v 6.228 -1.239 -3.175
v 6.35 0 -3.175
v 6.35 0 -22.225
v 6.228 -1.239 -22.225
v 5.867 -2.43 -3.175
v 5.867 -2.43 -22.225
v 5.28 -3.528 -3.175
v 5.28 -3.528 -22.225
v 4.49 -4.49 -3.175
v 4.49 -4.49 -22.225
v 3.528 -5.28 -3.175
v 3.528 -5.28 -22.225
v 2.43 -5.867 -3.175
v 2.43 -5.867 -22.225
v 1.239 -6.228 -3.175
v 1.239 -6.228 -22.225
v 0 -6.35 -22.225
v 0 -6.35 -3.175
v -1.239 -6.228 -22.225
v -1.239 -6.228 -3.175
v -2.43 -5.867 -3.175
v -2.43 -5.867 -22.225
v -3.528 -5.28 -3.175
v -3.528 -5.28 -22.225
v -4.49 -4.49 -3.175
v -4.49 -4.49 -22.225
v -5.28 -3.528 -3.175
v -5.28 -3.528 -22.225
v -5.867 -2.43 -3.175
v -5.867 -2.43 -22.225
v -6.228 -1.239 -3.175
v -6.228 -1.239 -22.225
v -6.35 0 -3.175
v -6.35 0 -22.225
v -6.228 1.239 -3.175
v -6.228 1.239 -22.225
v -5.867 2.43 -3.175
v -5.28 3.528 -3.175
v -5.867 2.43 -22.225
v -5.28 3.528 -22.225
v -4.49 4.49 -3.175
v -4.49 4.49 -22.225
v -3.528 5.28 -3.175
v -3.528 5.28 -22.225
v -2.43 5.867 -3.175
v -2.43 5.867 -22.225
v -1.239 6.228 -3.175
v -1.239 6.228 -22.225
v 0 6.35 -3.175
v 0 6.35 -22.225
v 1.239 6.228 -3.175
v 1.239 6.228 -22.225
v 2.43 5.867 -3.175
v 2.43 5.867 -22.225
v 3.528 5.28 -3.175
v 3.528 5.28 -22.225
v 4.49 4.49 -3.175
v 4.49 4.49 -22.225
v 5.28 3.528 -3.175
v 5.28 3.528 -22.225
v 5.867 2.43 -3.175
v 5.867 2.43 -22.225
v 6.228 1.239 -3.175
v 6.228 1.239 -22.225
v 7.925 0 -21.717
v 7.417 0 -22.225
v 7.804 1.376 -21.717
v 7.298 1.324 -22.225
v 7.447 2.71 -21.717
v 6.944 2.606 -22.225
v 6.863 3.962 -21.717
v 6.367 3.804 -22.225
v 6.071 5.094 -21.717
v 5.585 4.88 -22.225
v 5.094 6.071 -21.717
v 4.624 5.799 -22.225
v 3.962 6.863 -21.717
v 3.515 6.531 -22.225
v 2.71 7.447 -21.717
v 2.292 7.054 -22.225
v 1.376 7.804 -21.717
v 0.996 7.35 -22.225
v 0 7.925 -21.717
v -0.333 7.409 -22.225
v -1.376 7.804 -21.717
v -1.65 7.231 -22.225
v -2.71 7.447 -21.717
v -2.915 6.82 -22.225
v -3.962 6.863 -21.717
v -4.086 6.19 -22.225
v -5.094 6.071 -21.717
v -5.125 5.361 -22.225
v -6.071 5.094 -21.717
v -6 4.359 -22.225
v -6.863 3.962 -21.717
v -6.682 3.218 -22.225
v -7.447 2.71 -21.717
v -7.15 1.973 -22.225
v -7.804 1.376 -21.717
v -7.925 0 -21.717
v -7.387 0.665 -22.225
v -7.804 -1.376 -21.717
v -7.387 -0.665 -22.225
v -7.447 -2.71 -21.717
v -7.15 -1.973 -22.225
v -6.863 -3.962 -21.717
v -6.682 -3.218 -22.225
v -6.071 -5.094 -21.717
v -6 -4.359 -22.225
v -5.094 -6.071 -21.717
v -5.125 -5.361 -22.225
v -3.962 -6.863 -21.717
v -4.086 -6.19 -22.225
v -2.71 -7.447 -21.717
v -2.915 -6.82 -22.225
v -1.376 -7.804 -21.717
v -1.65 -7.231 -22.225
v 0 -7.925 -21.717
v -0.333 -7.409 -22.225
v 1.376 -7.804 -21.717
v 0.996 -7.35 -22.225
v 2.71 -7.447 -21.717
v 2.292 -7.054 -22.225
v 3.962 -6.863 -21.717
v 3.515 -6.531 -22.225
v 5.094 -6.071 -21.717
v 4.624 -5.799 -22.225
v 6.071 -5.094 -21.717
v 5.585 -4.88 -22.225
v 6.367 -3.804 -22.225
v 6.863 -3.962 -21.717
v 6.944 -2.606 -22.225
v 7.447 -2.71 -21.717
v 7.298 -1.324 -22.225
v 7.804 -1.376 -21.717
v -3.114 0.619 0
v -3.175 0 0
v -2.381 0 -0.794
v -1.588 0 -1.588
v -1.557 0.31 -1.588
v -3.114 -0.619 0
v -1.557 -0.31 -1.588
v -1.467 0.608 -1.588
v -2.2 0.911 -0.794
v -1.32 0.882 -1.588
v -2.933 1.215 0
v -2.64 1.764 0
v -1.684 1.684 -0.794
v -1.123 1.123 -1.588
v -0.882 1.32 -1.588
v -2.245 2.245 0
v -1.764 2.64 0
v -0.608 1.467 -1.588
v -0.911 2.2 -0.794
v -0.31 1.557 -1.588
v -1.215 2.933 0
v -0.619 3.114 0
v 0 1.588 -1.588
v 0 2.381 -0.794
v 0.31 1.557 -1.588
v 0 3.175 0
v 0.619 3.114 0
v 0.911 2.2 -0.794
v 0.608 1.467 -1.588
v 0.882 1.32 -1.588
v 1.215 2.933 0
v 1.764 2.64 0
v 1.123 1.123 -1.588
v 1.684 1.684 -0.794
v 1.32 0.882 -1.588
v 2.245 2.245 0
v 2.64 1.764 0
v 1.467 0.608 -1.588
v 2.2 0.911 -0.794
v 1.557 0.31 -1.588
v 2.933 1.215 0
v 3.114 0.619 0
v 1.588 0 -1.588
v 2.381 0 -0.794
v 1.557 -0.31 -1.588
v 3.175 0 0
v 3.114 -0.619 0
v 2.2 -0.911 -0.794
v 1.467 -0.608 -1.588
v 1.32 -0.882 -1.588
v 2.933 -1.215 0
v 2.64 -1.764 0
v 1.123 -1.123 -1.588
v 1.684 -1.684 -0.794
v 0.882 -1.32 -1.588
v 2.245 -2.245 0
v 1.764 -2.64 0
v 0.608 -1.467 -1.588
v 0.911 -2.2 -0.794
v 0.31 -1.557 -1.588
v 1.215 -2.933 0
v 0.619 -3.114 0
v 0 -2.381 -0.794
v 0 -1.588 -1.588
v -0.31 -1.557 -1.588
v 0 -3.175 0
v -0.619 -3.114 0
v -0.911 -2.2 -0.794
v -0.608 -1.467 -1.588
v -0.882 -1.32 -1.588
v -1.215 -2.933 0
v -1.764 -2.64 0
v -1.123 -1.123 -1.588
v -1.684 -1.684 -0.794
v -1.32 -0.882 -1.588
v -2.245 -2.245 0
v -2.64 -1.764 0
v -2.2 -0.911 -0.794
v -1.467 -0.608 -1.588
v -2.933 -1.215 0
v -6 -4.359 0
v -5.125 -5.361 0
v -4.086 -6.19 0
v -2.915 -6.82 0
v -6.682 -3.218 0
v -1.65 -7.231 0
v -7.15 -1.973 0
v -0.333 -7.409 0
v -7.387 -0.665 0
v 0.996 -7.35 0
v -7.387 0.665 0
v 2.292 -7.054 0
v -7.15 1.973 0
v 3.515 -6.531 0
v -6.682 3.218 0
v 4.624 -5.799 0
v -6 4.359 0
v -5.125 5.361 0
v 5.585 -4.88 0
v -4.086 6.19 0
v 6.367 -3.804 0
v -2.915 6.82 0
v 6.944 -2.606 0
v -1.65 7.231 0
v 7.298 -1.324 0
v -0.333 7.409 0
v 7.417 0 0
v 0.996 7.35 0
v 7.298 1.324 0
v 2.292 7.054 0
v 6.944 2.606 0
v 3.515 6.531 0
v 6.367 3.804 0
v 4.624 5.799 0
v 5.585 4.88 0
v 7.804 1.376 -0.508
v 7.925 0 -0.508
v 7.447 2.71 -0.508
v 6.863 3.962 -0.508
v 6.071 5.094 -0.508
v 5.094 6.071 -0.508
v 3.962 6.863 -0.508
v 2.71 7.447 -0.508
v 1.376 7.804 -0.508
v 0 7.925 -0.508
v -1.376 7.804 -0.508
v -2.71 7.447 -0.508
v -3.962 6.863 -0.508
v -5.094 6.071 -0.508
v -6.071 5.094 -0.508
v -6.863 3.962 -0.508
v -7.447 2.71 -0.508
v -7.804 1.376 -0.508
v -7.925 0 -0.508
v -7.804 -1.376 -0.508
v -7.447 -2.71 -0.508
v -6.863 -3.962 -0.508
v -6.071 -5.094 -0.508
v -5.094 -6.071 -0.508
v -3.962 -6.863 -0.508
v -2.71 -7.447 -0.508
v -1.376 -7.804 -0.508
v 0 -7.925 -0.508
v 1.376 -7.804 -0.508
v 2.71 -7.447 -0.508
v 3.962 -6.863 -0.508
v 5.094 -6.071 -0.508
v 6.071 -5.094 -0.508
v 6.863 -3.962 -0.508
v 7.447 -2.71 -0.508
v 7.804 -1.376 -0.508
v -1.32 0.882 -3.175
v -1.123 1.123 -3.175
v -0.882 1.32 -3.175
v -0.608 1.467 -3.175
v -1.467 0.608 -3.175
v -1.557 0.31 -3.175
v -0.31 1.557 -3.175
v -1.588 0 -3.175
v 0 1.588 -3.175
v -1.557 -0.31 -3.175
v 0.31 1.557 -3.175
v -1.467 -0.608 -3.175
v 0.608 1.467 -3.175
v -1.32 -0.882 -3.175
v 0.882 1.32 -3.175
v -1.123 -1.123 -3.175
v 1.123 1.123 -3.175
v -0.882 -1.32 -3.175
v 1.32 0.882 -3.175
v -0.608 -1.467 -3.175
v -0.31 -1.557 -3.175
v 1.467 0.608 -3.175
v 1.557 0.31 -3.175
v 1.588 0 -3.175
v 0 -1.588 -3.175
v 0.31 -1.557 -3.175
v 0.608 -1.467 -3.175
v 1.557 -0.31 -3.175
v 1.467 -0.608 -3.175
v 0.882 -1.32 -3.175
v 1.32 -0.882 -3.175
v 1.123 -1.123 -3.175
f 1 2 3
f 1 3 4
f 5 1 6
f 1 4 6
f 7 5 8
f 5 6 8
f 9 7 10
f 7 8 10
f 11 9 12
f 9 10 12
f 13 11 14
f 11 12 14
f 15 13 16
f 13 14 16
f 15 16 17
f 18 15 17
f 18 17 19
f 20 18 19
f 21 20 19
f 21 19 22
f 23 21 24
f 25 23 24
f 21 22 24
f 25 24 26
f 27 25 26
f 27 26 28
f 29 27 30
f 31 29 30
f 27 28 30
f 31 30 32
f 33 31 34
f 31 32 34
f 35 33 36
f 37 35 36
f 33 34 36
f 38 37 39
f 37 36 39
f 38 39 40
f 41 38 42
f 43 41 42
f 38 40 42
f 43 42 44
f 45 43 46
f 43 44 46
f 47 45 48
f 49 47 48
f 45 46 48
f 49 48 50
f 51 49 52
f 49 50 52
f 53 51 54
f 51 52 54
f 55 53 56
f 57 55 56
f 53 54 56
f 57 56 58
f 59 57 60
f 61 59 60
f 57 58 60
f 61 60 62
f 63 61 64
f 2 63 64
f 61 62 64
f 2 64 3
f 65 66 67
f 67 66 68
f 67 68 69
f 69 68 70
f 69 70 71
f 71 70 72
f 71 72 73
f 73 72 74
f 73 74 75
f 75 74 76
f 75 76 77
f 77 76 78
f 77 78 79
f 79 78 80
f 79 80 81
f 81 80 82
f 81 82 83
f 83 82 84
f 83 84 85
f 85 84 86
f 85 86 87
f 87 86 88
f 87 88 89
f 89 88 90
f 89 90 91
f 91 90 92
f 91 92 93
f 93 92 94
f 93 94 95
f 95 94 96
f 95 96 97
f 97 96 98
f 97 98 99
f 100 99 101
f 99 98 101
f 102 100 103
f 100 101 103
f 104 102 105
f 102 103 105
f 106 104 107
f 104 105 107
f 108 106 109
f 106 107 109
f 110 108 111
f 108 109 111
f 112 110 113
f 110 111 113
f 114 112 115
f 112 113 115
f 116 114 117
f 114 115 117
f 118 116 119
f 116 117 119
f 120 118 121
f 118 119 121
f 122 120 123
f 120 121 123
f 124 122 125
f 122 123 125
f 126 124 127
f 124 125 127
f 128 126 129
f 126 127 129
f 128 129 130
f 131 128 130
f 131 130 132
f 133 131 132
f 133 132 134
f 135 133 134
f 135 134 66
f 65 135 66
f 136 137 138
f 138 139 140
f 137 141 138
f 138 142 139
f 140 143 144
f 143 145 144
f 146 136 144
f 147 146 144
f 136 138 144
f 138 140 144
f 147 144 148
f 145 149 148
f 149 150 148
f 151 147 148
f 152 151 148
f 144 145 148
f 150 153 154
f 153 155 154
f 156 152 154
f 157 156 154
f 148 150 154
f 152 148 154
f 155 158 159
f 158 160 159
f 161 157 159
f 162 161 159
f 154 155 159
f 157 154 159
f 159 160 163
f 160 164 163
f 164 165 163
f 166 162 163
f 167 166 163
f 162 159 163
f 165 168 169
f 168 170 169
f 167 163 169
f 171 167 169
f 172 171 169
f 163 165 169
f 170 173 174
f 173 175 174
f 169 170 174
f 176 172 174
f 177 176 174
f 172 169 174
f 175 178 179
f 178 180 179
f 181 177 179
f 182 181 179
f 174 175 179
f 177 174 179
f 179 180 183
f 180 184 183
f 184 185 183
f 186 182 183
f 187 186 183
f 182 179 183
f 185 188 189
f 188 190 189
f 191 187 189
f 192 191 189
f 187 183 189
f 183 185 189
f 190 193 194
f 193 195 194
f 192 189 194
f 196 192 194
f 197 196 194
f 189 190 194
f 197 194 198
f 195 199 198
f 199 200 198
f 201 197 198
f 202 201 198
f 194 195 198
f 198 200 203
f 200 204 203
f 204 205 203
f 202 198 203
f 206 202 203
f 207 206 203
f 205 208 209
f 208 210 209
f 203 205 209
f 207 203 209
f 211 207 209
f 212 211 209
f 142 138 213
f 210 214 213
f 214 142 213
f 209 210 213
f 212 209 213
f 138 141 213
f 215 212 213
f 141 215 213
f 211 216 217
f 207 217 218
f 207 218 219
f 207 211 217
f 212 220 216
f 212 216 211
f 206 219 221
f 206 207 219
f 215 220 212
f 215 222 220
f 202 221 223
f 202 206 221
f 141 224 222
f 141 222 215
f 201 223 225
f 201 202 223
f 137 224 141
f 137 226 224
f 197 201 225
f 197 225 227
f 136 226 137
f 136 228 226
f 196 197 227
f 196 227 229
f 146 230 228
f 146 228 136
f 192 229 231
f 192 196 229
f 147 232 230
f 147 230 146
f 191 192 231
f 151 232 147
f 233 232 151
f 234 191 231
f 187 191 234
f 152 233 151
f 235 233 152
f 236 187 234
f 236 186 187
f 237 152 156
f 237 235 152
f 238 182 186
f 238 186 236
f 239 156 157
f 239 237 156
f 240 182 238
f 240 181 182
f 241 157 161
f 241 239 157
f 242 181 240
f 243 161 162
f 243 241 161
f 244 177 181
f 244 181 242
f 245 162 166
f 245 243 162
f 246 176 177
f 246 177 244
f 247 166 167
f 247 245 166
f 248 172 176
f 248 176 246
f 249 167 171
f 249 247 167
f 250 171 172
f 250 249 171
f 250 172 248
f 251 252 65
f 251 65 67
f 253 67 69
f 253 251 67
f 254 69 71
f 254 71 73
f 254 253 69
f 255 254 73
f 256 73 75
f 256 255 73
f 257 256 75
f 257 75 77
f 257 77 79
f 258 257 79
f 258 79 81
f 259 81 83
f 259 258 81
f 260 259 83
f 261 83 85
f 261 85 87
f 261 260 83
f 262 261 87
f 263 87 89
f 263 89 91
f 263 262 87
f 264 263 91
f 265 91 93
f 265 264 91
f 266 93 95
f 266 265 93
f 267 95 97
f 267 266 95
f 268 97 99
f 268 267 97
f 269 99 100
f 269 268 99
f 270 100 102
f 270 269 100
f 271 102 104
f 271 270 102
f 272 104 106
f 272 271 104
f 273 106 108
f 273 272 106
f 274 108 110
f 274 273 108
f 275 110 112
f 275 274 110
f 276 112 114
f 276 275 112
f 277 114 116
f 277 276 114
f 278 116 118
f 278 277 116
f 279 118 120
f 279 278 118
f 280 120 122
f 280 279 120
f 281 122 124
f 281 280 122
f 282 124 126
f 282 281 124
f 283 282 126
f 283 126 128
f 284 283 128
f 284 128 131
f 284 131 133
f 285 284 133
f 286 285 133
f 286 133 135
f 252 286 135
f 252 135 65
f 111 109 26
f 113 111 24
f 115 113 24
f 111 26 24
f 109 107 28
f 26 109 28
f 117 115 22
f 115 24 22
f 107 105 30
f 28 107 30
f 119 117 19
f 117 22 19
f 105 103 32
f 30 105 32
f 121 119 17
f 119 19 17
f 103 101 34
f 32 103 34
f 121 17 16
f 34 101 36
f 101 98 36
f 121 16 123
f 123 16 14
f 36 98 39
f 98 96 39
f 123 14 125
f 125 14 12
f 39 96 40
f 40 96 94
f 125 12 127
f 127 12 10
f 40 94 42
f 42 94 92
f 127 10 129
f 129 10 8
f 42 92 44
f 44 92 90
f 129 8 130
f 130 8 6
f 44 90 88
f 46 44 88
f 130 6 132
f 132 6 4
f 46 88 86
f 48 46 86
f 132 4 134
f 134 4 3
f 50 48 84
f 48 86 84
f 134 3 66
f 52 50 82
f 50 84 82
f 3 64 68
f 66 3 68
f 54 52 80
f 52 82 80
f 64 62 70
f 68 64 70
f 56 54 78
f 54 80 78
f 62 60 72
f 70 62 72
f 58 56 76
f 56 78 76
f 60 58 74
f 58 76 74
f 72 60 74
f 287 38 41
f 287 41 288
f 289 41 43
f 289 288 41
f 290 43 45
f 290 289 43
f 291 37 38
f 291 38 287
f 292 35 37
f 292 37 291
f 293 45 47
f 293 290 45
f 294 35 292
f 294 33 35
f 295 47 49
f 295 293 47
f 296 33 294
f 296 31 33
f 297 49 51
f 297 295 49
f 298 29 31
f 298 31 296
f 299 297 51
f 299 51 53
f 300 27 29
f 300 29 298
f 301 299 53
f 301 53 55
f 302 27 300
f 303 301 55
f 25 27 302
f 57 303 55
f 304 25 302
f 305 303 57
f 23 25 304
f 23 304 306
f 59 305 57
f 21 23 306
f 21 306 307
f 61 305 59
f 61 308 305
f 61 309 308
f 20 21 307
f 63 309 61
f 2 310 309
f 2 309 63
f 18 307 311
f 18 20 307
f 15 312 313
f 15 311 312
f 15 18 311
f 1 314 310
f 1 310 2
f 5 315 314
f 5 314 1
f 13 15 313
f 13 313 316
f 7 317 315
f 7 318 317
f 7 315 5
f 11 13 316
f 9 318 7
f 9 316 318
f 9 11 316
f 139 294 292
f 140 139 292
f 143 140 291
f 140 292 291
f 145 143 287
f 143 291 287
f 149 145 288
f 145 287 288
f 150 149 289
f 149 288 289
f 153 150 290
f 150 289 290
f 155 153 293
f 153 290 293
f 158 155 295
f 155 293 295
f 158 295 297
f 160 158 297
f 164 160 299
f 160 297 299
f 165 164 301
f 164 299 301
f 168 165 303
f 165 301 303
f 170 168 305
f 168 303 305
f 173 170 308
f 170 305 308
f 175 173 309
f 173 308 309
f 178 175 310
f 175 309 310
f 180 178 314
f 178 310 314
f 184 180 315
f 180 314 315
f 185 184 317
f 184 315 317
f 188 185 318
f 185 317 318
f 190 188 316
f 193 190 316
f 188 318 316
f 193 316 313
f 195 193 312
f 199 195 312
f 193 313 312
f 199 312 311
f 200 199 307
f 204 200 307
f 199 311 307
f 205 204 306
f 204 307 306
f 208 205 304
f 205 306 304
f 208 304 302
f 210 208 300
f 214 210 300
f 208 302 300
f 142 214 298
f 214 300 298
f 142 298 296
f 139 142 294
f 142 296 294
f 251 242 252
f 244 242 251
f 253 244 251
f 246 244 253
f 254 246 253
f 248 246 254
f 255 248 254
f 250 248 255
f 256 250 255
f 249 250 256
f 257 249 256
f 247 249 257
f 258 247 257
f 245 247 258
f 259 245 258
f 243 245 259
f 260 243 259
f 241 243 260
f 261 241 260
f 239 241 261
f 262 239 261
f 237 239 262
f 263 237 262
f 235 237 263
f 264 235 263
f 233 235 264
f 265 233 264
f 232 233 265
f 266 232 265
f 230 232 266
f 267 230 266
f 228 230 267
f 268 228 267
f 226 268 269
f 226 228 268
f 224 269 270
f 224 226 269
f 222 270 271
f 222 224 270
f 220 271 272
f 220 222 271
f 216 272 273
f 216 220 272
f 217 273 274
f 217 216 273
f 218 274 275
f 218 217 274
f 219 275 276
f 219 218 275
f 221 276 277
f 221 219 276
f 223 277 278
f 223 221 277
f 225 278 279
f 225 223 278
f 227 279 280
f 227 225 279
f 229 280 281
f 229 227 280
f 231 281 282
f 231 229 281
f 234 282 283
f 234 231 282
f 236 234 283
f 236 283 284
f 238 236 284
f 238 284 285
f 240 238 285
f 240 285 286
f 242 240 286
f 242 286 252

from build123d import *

# Parameters (mm, degrees)
F0_R           = 7.9248
F1_DEPTH       = 22.225
F3_D           = 3.175
F3_CSINK_D     = 6.35
F3_CSINK_ANGLE = 90
F4_R           = 6.35
F5_DEPTH       = 19.05
F6_SIZE        = 0.508
F7_SIZE        = 0.508


with BuildPart() as f1:
    # F0 (on Top) → F1 (new body)
    with BuildSketch(Plane.XY):
        Circle(F0_R)
    extrude(amount=-F1_DEPTH)

    # F3 (through all)
    with Locations(Plane.XY):
        with Locations((0, 0)):
            CounterSinkHole(F3_D / 2, F3_CSINK_D / 2, counter_sink_angle=F3_CSINK_ANGLE)

    # F4 (on face) → F5 (cut)
    with BuildSketch(Plane(origin=(0, 0, -22.225), x_dir=(1, 0, 0), z_dir=(0, 0, -1))):
        Circle(F4_R)
    extrude(amount=-F5_DEPTH, mode=Mode.SUBTRACT)

    # F6
    f6_edges = [f1.edges().sort_by_distance(p)[0] for p in [
        (-7.9248, 0, 0),
    ]]
    chamfer(f6_edges, length=F6_SIZE)

    # F7
    f7_edges = [f1.edges().sort_by_distance(p)[0] for p in [
        (-7.9248, 0, -22.225),
    ]]
    chamfer(f7_edges, length=F7_SIZE)


solid = f1.part
